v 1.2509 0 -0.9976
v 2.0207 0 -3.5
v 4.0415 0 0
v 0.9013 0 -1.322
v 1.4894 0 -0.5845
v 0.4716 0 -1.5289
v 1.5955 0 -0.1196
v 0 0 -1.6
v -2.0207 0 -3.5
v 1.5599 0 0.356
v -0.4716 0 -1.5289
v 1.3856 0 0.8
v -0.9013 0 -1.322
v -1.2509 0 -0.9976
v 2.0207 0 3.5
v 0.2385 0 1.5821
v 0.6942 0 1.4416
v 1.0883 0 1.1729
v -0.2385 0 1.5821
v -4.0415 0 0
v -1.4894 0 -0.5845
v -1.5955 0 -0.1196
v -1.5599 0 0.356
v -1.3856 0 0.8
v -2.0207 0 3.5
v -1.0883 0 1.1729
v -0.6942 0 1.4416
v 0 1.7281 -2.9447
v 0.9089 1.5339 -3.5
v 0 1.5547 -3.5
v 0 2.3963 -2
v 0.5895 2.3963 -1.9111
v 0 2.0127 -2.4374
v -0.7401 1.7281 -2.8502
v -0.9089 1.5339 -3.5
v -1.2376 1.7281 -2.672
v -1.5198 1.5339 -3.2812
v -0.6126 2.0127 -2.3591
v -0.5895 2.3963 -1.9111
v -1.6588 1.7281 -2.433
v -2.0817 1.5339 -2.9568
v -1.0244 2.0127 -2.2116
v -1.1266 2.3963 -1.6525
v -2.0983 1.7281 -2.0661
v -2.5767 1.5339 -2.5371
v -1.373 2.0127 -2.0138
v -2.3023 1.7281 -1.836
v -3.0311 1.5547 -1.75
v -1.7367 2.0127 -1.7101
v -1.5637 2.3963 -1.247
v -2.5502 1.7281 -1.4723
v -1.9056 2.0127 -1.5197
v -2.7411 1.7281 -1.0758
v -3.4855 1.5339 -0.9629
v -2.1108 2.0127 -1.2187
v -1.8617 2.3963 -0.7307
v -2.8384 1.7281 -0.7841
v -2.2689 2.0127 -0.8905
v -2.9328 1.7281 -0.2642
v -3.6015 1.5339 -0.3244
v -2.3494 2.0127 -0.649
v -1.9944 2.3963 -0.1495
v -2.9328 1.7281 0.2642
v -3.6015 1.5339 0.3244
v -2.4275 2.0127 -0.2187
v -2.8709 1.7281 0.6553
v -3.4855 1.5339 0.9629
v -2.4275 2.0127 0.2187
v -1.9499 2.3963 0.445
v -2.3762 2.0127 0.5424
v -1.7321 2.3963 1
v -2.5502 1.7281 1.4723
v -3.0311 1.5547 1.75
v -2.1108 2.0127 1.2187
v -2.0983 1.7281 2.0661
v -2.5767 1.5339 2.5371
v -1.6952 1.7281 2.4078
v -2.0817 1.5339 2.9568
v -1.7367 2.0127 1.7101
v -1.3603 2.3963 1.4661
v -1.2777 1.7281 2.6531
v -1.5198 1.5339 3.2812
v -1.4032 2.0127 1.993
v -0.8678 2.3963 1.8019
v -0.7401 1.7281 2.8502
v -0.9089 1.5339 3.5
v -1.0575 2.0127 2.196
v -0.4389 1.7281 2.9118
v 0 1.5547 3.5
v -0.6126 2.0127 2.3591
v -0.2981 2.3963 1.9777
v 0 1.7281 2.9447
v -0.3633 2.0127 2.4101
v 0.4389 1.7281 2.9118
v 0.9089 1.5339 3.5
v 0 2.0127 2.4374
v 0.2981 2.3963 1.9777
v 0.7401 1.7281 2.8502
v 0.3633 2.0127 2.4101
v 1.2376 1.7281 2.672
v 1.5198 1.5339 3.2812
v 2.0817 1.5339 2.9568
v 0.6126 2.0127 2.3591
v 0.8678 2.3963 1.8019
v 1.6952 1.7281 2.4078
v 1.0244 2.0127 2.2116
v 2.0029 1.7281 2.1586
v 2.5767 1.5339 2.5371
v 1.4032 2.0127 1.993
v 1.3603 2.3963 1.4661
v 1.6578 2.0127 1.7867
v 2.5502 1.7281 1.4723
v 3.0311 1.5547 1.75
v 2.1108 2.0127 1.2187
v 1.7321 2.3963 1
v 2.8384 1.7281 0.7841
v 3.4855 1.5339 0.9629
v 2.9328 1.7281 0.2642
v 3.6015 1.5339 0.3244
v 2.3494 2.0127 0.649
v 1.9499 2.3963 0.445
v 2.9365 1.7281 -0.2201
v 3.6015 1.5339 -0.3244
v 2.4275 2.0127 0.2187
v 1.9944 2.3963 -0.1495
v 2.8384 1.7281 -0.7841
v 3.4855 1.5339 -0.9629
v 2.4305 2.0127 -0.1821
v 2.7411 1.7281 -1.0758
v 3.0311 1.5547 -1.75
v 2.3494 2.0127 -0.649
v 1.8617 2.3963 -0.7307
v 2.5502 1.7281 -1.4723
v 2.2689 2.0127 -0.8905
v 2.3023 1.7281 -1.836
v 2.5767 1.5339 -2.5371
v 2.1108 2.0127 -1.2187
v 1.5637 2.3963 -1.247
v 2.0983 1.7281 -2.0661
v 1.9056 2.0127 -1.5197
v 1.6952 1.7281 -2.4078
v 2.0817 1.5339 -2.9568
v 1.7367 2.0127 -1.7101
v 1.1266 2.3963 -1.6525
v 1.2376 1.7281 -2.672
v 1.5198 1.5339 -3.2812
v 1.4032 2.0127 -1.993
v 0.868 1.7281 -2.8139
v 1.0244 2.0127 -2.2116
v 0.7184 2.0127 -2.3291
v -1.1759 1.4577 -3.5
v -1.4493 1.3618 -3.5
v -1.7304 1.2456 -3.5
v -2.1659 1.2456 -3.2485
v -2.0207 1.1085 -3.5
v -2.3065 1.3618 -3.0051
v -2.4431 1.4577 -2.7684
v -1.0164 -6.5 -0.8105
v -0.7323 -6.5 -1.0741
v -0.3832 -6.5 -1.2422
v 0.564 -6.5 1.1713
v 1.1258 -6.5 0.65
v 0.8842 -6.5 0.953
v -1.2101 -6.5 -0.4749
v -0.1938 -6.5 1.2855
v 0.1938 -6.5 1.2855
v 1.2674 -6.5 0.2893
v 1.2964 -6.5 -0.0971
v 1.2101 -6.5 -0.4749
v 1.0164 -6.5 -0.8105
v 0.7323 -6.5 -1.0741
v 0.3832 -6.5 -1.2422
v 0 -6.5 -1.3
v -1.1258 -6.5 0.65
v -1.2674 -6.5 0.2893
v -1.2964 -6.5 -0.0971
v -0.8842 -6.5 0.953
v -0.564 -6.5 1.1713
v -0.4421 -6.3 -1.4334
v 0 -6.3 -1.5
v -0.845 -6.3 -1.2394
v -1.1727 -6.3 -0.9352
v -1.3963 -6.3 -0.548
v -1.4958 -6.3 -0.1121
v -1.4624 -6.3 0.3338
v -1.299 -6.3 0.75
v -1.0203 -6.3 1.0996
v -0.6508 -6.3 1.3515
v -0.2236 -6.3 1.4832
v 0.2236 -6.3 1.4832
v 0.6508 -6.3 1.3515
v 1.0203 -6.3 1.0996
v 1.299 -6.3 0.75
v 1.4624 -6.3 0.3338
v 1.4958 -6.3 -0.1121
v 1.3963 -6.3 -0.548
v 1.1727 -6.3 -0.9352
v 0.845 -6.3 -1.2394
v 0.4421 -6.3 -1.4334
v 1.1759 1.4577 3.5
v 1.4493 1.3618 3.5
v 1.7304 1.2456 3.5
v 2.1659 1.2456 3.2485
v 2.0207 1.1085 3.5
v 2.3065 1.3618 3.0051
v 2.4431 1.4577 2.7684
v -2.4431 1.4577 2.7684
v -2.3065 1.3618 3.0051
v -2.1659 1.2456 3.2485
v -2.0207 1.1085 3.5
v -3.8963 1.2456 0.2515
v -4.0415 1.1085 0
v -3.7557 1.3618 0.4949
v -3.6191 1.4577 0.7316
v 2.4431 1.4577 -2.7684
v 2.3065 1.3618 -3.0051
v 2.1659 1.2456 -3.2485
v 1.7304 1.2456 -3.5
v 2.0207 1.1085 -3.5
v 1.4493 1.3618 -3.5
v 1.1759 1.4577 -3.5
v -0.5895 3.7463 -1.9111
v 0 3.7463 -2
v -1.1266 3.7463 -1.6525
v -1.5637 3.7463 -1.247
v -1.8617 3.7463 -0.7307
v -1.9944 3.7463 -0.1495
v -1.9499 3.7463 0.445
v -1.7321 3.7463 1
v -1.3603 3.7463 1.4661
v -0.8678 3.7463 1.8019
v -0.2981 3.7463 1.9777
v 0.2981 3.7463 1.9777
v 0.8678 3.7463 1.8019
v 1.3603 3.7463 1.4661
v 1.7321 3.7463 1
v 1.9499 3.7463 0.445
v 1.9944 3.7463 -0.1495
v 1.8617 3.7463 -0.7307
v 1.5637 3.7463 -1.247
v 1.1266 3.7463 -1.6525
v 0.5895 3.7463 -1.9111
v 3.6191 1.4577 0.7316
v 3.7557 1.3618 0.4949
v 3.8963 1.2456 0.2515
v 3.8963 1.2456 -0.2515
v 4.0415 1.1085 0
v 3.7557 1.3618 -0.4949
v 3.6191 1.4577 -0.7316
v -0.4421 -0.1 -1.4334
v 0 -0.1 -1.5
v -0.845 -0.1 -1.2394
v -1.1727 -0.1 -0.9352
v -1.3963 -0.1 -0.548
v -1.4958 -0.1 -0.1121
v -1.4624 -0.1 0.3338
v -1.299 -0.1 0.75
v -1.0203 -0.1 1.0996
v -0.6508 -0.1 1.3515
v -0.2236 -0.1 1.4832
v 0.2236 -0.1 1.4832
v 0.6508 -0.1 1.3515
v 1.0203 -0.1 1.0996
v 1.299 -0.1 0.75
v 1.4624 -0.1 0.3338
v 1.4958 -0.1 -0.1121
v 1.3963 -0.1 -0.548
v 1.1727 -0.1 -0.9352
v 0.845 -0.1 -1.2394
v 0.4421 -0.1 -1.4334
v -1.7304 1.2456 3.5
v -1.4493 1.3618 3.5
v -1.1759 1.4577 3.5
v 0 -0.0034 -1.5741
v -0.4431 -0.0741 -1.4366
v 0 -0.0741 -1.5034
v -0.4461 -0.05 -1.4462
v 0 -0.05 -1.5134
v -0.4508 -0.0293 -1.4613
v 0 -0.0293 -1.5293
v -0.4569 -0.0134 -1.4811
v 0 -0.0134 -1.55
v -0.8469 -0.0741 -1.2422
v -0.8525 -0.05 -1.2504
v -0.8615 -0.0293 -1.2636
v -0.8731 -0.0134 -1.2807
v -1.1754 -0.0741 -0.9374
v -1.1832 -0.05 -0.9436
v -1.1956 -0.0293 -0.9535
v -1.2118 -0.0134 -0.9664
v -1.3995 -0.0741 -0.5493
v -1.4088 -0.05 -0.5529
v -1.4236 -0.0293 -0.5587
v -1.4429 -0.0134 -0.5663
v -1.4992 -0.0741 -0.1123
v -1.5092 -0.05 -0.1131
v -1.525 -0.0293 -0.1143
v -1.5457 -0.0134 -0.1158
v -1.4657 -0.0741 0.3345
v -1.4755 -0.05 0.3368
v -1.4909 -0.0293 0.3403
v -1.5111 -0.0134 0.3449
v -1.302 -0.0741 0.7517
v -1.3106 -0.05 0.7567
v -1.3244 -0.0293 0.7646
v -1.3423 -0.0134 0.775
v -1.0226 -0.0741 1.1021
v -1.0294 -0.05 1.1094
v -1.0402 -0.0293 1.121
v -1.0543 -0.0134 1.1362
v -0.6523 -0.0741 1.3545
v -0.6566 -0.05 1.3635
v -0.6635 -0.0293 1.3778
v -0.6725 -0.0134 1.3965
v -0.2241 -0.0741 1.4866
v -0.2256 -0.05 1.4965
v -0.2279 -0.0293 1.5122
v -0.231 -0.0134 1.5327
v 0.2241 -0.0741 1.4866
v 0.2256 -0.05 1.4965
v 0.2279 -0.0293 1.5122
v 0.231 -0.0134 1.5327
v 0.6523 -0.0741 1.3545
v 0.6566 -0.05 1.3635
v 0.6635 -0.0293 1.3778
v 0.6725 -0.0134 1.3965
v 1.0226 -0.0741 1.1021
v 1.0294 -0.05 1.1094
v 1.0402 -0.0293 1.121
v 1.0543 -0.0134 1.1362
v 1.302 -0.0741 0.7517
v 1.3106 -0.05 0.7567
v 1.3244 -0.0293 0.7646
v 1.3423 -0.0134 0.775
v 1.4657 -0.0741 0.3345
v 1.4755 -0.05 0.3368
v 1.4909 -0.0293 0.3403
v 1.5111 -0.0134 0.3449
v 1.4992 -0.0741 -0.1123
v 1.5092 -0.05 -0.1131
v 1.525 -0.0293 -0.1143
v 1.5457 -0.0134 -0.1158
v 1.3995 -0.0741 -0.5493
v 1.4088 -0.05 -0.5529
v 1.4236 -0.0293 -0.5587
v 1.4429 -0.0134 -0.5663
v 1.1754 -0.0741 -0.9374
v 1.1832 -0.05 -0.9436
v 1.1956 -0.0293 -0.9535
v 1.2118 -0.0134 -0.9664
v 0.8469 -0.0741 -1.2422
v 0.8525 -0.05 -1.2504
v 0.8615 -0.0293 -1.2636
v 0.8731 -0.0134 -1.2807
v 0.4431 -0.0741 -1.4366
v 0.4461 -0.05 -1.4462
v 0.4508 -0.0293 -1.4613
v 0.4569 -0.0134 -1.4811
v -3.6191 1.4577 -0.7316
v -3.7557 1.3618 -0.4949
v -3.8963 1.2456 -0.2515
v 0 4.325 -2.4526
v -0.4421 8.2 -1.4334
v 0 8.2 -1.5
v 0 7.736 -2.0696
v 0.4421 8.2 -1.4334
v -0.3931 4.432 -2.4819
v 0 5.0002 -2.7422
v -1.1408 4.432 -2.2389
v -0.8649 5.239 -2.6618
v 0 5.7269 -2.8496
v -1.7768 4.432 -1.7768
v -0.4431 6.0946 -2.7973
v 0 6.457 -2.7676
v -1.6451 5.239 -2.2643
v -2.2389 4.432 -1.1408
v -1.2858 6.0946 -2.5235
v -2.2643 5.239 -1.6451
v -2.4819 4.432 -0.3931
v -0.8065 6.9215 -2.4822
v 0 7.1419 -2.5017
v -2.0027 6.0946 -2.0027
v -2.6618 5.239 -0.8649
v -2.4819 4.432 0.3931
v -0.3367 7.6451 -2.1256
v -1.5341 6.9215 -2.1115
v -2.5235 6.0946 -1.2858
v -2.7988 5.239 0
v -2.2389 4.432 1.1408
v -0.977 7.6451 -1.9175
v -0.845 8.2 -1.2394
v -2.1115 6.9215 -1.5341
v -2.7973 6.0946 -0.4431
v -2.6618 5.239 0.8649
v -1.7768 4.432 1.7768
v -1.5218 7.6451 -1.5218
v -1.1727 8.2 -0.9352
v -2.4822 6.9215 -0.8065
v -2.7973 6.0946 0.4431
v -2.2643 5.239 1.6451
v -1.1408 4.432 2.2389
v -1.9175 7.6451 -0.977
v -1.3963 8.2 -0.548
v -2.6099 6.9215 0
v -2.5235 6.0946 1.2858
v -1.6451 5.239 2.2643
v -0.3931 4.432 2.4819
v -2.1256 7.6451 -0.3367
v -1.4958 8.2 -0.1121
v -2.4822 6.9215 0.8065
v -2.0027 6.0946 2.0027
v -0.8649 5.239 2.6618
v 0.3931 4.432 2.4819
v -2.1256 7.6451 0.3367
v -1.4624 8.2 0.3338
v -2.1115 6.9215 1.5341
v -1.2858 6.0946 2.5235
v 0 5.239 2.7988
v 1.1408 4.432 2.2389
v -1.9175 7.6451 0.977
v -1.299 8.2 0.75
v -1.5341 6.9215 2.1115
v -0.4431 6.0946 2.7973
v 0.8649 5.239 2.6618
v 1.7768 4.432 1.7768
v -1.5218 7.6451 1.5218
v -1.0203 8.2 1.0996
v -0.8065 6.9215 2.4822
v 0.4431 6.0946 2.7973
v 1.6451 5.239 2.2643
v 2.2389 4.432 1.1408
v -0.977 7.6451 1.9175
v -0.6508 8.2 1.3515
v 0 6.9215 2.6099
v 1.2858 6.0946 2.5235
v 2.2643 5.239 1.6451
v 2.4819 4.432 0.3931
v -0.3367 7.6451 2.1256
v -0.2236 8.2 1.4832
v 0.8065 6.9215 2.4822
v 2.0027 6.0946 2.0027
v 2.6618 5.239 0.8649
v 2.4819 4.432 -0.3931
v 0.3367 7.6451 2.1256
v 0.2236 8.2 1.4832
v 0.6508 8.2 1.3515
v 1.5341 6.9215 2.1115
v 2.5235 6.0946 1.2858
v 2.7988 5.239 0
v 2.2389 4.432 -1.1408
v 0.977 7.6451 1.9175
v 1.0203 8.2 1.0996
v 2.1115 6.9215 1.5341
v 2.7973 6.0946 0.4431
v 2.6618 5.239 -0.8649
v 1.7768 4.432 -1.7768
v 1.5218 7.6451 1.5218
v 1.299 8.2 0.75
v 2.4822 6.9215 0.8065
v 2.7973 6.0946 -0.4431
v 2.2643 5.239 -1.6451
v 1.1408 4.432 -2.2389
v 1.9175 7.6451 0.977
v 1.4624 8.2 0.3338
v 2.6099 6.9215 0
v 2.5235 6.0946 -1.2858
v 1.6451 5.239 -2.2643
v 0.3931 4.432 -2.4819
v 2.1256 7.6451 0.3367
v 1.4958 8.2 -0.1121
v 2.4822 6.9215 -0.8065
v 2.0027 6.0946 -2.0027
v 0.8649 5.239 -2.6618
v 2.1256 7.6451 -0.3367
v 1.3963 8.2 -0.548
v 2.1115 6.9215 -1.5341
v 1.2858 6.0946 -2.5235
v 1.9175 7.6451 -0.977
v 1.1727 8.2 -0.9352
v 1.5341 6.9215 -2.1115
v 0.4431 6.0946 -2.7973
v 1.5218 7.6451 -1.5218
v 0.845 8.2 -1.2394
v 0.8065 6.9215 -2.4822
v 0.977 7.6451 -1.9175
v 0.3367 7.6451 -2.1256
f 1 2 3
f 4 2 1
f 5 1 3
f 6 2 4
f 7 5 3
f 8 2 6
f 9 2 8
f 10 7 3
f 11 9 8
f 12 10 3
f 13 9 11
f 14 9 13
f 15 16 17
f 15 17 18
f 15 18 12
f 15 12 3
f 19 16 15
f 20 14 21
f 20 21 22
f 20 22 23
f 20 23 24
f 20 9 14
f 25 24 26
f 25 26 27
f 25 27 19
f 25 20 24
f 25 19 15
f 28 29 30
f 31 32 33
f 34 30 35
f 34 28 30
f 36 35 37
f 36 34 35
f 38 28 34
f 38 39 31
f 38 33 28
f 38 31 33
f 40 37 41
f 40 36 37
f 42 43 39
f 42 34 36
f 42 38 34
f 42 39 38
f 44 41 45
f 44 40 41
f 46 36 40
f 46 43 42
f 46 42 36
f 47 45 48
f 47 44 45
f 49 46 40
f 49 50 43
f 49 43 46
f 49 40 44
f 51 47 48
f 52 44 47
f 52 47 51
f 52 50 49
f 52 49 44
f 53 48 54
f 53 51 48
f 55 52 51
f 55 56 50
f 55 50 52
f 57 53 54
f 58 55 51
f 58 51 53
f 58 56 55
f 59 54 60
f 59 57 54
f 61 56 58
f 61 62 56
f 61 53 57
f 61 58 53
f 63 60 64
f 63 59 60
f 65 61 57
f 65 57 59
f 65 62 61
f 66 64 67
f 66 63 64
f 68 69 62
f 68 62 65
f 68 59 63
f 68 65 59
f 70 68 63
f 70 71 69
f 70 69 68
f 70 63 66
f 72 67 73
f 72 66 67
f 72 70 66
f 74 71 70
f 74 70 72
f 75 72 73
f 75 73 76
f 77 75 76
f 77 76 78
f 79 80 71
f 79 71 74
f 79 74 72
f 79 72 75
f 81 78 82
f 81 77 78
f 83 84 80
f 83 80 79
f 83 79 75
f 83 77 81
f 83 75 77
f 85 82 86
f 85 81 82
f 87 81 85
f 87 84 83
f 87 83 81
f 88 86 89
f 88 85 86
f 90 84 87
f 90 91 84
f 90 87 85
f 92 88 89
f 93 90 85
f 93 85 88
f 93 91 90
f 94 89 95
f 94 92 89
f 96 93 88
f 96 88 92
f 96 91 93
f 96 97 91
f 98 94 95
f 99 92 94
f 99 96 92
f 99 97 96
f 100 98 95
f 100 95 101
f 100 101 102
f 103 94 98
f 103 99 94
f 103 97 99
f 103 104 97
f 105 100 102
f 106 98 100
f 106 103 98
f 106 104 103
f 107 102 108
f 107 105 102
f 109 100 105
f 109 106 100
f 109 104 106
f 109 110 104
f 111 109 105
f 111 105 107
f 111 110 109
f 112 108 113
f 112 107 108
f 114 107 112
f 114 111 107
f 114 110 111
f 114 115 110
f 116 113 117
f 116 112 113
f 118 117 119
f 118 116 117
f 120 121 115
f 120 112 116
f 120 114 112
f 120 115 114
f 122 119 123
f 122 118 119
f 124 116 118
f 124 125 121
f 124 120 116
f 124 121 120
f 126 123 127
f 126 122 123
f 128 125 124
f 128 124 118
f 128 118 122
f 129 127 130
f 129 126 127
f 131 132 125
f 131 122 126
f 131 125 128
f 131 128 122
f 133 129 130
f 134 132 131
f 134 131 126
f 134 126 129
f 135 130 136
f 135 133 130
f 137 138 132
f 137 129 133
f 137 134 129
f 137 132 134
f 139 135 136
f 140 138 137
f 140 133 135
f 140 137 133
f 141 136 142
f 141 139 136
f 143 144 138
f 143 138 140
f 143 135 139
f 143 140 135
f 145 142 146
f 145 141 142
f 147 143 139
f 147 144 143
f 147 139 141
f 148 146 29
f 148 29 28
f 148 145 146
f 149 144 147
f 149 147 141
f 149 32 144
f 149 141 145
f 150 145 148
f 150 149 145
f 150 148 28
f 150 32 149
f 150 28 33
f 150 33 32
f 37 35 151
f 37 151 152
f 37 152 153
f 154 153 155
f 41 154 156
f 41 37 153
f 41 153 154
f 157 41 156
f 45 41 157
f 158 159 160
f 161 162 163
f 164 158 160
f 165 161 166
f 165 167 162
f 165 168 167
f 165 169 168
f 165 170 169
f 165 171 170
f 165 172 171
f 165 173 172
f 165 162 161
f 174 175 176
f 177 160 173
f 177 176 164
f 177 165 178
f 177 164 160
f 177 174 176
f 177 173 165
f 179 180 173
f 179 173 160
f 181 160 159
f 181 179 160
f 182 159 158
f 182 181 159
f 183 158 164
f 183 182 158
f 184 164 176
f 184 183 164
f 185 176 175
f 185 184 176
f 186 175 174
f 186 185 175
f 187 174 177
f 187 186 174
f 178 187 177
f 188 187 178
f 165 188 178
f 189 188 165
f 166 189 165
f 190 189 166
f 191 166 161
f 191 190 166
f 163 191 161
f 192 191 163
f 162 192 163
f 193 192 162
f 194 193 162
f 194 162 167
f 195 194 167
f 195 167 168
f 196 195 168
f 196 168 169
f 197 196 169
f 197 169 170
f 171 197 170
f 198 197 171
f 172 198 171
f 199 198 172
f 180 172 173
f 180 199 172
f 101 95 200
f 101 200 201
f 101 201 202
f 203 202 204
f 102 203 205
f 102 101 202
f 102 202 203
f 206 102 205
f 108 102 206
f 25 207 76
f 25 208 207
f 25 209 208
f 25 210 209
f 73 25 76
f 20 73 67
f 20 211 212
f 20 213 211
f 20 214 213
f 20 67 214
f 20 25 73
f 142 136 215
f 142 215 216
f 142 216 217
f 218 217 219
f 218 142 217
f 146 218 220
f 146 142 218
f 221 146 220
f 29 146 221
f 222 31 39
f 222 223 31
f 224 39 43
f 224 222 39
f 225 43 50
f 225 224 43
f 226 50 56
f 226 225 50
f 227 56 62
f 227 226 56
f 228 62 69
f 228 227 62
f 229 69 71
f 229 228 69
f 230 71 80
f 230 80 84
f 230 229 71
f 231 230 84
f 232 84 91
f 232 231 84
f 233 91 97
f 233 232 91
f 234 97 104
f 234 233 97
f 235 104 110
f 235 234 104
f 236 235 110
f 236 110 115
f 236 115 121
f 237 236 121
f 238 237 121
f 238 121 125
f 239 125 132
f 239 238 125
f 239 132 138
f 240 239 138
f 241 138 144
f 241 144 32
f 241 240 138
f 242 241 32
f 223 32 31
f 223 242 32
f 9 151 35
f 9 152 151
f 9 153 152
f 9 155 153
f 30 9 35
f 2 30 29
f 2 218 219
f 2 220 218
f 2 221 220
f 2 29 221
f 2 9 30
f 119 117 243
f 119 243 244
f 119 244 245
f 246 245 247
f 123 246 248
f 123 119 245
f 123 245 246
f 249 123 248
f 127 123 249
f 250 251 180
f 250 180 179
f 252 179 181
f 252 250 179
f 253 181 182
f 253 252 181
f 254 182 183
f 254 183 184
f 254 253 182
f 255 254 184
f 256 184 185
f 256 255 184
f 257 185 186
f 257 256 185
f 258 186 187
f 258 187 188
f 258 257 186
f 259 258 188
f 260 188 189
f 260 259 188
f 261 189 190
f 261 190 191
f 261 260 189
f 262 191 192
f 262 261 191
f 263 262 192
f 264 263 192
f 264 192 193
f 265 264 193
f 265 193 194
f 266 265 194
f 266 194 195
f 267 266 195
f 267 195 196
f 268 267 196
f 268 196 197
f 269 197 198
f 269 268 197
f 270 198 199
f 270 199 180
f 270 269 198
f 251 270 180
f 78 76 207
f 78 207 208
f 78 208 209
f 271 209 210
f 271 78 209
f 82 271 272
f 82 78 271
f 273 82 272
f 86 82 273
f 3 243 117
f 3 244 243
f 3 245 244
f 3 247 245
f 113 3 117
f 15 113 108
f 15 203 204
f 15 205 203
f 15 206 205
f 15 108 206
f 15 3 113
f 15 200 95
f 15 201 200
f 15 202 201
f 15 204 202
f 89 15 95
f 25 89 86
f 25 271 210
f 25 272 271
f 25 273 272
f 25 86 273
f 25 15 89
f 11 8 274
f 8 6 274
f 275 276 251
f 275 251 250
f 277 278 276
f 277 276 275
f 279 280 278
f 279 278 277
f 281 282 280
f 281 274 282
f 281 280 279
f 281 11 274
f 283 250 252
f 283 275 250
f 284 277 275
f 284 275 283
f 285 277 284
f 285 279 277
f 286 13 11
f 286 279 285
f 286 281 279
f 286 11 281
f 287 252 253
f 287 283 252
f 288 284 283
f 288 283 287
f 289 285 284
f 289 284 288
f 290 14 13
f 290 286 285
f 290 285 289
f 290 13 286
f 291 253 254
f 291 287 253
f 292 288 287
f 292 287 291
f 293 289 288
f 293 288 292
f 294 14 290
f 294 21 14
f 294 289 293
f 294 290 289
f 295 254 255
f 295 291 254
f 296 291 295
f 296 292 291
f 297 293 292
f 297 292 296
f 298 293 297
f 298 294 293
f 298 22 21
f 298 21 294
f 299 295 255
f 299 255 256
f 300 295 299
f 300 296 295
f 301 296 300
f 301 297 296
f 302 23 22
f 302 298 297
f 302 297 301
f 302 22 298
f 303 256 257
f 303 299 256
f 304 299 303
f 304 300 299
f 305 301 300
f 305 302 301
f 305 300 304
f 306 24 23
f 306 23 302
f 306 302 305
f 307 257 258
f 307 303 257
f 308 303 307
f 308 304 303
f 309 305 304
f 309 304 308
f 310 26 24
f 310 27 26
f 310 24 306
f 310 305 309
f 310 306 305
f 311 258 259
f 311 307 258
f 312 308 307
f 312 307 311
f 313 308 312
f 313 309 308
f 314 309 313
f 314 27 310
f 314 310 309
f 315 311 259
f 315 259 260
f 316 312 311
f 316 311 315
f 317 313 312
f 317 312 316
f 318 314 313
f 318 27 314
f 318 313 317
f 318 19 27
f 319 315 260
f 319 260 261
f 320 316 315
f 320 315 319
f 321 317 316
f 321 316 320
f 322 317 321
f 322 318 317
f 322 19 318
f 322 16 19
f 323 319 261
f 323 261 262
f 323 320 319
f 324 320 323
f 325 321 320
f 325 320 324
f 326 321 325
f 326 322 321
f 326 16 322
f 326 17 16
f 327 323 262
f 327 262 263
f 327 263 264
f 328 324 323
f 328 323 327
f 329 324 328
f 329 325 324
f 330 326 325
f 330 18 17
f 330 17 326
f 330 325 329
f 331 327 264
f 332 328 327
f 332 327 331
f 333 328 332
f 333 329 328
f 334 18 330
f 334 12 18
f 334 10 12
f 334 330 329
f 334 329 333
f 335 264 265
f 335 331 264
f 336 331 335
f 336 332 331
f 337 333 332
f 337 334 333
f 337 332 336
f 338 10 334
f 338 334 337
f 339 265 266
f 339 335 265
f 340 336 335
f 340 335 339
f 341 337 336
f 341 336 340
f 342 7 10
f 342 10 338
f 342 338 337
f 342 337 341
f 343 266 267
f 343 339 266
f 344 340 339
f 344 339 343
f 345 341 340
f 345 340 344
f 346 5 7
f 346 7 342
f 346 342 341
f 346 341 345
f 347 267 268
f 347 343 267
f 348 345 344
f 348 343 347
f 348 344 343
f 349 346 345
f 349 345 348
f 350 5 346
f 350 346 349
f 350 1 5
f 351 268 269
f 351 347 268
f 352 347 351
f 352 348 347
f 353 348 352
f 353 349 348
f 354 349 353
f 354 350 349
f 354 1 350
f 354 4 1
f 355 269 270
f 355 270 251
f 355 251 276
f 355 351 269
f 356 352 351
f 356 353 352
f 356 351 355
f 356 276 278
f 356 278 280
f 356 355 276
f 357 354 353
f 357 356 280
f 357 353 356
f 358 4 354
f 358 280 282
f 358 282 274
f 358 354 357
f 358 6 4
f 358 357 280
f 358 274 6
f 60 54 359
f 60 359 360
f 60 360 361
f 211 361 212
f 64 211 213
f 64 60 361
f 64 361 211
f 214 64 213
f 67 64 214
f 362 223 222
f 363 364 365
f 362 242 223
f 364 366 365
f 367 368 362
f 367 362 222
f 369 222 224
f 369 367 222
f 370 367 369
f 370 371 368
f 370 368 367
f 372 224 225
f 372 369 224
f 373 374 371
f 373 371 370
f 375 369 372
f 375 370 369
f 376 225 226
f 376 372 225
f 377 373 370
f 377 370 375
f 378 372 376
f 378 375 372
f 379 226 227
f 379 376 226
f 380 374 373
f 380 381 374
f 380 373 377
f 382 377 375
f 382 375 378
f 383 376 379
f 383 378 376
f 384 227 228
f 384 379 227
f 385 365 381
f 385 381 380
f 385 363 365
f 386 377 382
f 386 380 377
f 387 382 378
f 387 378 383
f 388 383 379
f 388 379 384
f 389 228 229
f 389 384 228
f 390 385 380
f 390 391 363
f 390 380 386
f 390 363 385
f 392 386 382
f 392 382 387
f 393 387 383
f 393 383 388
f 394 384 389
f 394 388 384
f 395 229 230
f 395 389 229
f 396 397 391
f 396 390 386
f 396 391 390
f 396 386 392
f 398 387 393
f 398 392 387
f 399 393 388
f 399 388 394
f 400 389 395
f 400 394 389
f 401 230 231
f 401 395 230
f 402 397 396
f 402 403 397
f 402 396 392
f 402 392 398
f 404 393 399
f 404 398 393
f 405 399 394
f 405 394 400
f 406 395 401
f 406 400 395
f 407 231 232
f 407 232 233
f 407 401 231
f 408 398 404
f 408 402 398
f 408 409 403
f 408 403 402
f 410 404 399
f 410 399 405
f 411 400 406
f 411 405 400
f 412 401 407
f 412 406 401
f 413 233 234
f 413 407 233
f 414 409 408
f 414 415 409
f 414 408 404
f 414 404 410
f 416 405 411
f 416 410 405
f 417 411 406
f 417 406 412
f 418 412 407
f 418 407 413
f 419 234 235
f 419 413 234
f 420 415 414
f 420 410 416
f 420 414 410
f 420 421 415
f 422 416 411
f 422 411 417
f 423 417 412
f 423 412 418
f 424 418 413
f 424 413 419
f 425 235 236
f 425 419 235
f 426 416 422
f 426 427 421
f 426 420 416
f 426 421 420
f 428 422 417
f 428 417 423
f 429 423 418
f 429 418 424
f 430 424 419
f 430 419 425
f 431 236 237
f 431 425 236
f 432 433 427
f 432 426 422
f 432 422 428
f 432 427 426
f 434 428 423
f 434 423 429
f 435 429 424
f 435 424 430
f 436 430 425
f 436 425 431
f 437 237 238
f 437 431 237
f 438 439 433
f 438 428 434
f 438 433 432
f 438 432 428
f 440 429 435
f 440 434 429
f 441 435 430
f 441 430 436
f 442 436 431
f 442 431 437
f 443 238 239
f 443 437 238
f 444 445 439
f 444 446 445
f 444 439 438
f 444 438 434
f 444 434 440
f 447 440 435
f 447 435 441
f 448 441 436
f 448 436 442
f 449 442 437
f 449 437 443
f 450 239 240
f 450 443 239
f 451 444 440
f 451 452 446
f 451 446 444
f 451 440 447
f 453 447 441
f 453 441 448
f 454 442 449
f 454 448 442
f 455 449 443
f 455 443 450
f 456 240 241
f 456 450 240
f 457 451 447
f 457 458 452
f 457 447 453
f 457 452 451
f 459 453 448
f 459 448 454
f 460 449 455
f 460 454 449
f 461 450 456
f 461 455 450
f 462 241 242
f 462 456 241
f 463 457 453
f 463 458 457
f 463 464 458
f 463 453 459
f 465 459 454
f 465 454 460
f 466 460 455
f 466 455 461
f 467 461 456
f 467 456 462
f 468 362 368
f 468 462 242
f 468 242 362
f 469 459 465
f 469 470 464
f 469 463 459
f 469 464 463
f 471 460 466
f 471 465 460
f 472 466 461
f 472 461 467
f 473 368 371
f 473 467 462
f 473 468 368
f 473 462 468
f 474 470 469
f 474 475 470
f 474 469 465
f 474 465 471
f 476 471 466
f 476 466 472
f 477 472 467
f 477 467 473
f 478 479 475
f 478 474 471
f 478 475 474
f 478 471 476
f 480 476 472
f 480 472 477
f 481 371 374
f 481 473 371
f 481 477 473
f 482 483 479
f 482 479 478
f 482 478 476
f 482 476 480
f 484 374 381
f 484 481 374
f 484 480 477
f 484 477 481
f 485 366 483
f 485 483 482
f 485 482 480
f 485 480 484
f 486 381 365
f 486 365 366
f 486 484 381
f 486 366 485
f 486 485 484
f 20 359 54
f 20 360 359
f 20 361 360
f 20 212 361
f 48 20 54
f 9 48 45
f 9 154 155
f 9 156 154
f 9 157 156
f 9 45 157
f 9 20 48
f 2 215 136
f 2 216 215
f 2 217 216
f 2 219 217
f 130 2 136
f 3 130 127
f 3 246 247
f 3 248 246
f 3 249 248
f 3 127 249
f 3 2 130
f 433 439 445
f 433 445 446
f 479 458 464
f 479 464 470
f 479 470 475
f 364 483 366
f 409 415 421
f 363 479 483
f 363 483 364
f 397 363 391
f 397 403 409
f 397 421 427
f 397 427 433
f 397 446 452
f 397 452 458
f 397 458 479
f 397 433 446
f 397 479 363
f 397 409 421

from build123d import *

# Parameters (mm, degrees)
CHANFREIN1_SIZE         = 0.4
ESQUISSE2_OUTSIDE_W     = 13.828
ESQUISSE2_OUTSIDE_H     = 13.828
ENL_V_MAT_EXTRU_1_DEPTH = 11.002249747
CHANFREIN2_SIZE         = 0.2
CONG_2_R                = 0.1


with BuildPart() as part:
    # Esquisse1 → Révolution1 (revolve)
    with BuildSketch(Plane.XY, mode=Mode.PRIVATE) as r_volution1_sk:
        with BuildLine():
            Line((0, -6.5), (-1.5, -6.5))
            Line((-1.5, -6.5), (-1.5, 0))
            Line((-1.5, 0), (-4.05, 0))
            Line((-4.05, 0), (-4.05, 1.5))
            ThreePointArc((-4.05, 1.5), (-2.931315388, 1.73386291), (-2, 2.396281786))
            Line((-2, 2.396281786), (-2, 3.746281786))
            ThreePointArc((-2, 3.746281786), (-2.832207881, 6.094635769), (-1.5, 8.2))
            Line((-1.5, 8.2), (0, 8.2))
            Line((0, 8.2), (0, -6.5))
        make_face()
    revolve(r_volution1_sk.sketch.rotate(Axis((0, -9.21016139, 0), (0, 1, 0)), 270), axis=Axis((0, -9.21016139, 0), (0, 1, 0)))

    # Chanfrein1
    # the kernel refuses this chamfer: 0.4 mm, written as the material it takes off along each edge
    with BuildSketch(Plane(origin=(0, 1.5, 0), x_dir=(0, 0, -1), z_dir=(1, 0, 0))) as chanfrein1_piece_1:
        with BuildLine():
            Line((4.05, -CHANFREIN1_SIZE), (3.616082015, 0.033917985))
            ThreePointArc((3.616082015, 0.033917985), (3.826287877, 0.008975254), (4.05, 0))
            Line((4.05, 0), (4.05, -CHANFREIN1_SIZE))
        make_face()
    revolve(axis=Axis((0, 1.5, 0), (0, 1, 0)), mode=Mode.SUBTRACT)

    # Esquisse2 outside → Enlèv. mat.-Extru.1 (cut, through all)
    with BuildSketch(Plane.XZ):
        Rectangle(ESQUISSE2_OUTSIDE_W, ESQUISSE2_OUTSIDE_H)
        Polygon((2.020725942, 3.5), (-2.020725942, 3.5), (-4.041451884, 0), (-2.020725942, -3.5), (2.020725942, -3.5), (4.041451884, 0), align=None, mode=Mode.SUBTRACT)
    extrude(amount=-ENL_V_MAT_EXTRU_1_DEPTH, mode=Mode.SUBTRACT)

    # Chanfrein2
    chanfrein2_edges = [part.edges().sort_by_distance(p)[0] for p in [
        (0, -6.5, 1.5),
    ]]
    chamfer(chanfrein2_edges, length=CHANFREIN2_SIZE)

    # Congé2
    cong_2_edges = [part.edges().sort_by_distance(p)[0] for p in [
        (0, 0, 1.5),
    ]]
    fillet(cong_2_edges, radius=CONG_2_R)


solid = part.part
